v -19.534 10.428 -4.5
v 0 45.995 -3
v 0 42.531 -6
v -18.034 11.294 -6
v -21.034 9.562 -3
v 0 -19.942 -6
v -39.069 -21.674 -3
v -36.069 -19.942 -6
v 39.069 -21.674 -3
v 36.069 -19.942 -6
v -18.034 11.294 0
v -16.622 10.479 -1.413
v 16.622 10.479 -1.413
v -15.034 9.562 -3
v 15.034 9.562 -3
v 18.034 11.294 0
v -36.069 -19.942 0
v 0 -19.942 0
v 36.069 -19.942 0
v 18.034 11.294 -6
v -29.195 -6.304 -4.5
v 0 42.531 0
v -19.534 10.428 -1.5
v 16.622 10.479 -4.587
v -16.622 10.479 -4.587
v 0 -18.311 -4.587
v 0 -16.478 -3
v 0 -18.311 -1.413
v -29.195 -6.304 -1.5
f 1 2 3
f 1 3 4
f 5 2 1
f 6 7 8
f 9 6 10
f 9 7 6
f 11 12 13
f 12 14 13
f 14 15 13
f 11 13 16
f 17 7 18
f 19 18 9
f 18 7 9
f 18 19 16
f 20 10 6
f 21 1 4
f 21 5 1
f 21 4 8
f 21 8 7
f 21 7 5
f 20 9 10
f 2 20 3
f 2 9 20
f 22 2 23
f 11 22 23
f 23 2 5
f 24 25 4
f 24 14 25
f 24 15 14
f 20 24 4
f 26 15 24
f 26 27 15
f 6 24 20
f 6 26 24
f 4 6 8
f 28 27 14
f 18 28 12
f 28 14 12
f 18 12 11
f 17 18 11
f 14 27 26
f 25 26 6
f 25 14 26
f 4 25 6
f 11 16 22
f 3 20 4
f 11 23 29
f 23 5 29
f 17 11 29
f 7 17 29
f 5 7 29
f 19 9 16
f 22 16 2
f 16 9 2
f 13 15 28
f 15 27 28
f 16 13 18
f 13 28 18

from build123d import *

# Parameters (mm, degrees)
F1_DEPTH = 3
F1_TAPER = -30


with BuildPart() as f1:
    # F0 (on Top) → F1 (new body)
    with BuildSketch(Plane.XY):
        Polygon((36.0686861882, -19.9420294206), (18.0343430941, 11.2943690995), (0, -19.9420294206), align=None)
        Polygon((0, -19.9420294206), (-18.0343430941, 11.2943690995), (-36.0686861882, -19.9420294206), align=None)
        Polygon((18.0343430941, 11.2943690995), (0, 42.5307676196), (-18.0343430941, 11.2943690995), align=None)
    extrude(amount=-F1_DEPTH, taper=F1_TAPER)

    # F2: union 

    # F3: F1 across face


with BuildPart() as f1_1:
    add(f1.part)
    add(f1.part.mirror(Plane(origin=(0, 0.8822362595, -3), x_dir=(1, 0, 0), z_dir=(0, 0, -1))))


solid = f1_1.part
